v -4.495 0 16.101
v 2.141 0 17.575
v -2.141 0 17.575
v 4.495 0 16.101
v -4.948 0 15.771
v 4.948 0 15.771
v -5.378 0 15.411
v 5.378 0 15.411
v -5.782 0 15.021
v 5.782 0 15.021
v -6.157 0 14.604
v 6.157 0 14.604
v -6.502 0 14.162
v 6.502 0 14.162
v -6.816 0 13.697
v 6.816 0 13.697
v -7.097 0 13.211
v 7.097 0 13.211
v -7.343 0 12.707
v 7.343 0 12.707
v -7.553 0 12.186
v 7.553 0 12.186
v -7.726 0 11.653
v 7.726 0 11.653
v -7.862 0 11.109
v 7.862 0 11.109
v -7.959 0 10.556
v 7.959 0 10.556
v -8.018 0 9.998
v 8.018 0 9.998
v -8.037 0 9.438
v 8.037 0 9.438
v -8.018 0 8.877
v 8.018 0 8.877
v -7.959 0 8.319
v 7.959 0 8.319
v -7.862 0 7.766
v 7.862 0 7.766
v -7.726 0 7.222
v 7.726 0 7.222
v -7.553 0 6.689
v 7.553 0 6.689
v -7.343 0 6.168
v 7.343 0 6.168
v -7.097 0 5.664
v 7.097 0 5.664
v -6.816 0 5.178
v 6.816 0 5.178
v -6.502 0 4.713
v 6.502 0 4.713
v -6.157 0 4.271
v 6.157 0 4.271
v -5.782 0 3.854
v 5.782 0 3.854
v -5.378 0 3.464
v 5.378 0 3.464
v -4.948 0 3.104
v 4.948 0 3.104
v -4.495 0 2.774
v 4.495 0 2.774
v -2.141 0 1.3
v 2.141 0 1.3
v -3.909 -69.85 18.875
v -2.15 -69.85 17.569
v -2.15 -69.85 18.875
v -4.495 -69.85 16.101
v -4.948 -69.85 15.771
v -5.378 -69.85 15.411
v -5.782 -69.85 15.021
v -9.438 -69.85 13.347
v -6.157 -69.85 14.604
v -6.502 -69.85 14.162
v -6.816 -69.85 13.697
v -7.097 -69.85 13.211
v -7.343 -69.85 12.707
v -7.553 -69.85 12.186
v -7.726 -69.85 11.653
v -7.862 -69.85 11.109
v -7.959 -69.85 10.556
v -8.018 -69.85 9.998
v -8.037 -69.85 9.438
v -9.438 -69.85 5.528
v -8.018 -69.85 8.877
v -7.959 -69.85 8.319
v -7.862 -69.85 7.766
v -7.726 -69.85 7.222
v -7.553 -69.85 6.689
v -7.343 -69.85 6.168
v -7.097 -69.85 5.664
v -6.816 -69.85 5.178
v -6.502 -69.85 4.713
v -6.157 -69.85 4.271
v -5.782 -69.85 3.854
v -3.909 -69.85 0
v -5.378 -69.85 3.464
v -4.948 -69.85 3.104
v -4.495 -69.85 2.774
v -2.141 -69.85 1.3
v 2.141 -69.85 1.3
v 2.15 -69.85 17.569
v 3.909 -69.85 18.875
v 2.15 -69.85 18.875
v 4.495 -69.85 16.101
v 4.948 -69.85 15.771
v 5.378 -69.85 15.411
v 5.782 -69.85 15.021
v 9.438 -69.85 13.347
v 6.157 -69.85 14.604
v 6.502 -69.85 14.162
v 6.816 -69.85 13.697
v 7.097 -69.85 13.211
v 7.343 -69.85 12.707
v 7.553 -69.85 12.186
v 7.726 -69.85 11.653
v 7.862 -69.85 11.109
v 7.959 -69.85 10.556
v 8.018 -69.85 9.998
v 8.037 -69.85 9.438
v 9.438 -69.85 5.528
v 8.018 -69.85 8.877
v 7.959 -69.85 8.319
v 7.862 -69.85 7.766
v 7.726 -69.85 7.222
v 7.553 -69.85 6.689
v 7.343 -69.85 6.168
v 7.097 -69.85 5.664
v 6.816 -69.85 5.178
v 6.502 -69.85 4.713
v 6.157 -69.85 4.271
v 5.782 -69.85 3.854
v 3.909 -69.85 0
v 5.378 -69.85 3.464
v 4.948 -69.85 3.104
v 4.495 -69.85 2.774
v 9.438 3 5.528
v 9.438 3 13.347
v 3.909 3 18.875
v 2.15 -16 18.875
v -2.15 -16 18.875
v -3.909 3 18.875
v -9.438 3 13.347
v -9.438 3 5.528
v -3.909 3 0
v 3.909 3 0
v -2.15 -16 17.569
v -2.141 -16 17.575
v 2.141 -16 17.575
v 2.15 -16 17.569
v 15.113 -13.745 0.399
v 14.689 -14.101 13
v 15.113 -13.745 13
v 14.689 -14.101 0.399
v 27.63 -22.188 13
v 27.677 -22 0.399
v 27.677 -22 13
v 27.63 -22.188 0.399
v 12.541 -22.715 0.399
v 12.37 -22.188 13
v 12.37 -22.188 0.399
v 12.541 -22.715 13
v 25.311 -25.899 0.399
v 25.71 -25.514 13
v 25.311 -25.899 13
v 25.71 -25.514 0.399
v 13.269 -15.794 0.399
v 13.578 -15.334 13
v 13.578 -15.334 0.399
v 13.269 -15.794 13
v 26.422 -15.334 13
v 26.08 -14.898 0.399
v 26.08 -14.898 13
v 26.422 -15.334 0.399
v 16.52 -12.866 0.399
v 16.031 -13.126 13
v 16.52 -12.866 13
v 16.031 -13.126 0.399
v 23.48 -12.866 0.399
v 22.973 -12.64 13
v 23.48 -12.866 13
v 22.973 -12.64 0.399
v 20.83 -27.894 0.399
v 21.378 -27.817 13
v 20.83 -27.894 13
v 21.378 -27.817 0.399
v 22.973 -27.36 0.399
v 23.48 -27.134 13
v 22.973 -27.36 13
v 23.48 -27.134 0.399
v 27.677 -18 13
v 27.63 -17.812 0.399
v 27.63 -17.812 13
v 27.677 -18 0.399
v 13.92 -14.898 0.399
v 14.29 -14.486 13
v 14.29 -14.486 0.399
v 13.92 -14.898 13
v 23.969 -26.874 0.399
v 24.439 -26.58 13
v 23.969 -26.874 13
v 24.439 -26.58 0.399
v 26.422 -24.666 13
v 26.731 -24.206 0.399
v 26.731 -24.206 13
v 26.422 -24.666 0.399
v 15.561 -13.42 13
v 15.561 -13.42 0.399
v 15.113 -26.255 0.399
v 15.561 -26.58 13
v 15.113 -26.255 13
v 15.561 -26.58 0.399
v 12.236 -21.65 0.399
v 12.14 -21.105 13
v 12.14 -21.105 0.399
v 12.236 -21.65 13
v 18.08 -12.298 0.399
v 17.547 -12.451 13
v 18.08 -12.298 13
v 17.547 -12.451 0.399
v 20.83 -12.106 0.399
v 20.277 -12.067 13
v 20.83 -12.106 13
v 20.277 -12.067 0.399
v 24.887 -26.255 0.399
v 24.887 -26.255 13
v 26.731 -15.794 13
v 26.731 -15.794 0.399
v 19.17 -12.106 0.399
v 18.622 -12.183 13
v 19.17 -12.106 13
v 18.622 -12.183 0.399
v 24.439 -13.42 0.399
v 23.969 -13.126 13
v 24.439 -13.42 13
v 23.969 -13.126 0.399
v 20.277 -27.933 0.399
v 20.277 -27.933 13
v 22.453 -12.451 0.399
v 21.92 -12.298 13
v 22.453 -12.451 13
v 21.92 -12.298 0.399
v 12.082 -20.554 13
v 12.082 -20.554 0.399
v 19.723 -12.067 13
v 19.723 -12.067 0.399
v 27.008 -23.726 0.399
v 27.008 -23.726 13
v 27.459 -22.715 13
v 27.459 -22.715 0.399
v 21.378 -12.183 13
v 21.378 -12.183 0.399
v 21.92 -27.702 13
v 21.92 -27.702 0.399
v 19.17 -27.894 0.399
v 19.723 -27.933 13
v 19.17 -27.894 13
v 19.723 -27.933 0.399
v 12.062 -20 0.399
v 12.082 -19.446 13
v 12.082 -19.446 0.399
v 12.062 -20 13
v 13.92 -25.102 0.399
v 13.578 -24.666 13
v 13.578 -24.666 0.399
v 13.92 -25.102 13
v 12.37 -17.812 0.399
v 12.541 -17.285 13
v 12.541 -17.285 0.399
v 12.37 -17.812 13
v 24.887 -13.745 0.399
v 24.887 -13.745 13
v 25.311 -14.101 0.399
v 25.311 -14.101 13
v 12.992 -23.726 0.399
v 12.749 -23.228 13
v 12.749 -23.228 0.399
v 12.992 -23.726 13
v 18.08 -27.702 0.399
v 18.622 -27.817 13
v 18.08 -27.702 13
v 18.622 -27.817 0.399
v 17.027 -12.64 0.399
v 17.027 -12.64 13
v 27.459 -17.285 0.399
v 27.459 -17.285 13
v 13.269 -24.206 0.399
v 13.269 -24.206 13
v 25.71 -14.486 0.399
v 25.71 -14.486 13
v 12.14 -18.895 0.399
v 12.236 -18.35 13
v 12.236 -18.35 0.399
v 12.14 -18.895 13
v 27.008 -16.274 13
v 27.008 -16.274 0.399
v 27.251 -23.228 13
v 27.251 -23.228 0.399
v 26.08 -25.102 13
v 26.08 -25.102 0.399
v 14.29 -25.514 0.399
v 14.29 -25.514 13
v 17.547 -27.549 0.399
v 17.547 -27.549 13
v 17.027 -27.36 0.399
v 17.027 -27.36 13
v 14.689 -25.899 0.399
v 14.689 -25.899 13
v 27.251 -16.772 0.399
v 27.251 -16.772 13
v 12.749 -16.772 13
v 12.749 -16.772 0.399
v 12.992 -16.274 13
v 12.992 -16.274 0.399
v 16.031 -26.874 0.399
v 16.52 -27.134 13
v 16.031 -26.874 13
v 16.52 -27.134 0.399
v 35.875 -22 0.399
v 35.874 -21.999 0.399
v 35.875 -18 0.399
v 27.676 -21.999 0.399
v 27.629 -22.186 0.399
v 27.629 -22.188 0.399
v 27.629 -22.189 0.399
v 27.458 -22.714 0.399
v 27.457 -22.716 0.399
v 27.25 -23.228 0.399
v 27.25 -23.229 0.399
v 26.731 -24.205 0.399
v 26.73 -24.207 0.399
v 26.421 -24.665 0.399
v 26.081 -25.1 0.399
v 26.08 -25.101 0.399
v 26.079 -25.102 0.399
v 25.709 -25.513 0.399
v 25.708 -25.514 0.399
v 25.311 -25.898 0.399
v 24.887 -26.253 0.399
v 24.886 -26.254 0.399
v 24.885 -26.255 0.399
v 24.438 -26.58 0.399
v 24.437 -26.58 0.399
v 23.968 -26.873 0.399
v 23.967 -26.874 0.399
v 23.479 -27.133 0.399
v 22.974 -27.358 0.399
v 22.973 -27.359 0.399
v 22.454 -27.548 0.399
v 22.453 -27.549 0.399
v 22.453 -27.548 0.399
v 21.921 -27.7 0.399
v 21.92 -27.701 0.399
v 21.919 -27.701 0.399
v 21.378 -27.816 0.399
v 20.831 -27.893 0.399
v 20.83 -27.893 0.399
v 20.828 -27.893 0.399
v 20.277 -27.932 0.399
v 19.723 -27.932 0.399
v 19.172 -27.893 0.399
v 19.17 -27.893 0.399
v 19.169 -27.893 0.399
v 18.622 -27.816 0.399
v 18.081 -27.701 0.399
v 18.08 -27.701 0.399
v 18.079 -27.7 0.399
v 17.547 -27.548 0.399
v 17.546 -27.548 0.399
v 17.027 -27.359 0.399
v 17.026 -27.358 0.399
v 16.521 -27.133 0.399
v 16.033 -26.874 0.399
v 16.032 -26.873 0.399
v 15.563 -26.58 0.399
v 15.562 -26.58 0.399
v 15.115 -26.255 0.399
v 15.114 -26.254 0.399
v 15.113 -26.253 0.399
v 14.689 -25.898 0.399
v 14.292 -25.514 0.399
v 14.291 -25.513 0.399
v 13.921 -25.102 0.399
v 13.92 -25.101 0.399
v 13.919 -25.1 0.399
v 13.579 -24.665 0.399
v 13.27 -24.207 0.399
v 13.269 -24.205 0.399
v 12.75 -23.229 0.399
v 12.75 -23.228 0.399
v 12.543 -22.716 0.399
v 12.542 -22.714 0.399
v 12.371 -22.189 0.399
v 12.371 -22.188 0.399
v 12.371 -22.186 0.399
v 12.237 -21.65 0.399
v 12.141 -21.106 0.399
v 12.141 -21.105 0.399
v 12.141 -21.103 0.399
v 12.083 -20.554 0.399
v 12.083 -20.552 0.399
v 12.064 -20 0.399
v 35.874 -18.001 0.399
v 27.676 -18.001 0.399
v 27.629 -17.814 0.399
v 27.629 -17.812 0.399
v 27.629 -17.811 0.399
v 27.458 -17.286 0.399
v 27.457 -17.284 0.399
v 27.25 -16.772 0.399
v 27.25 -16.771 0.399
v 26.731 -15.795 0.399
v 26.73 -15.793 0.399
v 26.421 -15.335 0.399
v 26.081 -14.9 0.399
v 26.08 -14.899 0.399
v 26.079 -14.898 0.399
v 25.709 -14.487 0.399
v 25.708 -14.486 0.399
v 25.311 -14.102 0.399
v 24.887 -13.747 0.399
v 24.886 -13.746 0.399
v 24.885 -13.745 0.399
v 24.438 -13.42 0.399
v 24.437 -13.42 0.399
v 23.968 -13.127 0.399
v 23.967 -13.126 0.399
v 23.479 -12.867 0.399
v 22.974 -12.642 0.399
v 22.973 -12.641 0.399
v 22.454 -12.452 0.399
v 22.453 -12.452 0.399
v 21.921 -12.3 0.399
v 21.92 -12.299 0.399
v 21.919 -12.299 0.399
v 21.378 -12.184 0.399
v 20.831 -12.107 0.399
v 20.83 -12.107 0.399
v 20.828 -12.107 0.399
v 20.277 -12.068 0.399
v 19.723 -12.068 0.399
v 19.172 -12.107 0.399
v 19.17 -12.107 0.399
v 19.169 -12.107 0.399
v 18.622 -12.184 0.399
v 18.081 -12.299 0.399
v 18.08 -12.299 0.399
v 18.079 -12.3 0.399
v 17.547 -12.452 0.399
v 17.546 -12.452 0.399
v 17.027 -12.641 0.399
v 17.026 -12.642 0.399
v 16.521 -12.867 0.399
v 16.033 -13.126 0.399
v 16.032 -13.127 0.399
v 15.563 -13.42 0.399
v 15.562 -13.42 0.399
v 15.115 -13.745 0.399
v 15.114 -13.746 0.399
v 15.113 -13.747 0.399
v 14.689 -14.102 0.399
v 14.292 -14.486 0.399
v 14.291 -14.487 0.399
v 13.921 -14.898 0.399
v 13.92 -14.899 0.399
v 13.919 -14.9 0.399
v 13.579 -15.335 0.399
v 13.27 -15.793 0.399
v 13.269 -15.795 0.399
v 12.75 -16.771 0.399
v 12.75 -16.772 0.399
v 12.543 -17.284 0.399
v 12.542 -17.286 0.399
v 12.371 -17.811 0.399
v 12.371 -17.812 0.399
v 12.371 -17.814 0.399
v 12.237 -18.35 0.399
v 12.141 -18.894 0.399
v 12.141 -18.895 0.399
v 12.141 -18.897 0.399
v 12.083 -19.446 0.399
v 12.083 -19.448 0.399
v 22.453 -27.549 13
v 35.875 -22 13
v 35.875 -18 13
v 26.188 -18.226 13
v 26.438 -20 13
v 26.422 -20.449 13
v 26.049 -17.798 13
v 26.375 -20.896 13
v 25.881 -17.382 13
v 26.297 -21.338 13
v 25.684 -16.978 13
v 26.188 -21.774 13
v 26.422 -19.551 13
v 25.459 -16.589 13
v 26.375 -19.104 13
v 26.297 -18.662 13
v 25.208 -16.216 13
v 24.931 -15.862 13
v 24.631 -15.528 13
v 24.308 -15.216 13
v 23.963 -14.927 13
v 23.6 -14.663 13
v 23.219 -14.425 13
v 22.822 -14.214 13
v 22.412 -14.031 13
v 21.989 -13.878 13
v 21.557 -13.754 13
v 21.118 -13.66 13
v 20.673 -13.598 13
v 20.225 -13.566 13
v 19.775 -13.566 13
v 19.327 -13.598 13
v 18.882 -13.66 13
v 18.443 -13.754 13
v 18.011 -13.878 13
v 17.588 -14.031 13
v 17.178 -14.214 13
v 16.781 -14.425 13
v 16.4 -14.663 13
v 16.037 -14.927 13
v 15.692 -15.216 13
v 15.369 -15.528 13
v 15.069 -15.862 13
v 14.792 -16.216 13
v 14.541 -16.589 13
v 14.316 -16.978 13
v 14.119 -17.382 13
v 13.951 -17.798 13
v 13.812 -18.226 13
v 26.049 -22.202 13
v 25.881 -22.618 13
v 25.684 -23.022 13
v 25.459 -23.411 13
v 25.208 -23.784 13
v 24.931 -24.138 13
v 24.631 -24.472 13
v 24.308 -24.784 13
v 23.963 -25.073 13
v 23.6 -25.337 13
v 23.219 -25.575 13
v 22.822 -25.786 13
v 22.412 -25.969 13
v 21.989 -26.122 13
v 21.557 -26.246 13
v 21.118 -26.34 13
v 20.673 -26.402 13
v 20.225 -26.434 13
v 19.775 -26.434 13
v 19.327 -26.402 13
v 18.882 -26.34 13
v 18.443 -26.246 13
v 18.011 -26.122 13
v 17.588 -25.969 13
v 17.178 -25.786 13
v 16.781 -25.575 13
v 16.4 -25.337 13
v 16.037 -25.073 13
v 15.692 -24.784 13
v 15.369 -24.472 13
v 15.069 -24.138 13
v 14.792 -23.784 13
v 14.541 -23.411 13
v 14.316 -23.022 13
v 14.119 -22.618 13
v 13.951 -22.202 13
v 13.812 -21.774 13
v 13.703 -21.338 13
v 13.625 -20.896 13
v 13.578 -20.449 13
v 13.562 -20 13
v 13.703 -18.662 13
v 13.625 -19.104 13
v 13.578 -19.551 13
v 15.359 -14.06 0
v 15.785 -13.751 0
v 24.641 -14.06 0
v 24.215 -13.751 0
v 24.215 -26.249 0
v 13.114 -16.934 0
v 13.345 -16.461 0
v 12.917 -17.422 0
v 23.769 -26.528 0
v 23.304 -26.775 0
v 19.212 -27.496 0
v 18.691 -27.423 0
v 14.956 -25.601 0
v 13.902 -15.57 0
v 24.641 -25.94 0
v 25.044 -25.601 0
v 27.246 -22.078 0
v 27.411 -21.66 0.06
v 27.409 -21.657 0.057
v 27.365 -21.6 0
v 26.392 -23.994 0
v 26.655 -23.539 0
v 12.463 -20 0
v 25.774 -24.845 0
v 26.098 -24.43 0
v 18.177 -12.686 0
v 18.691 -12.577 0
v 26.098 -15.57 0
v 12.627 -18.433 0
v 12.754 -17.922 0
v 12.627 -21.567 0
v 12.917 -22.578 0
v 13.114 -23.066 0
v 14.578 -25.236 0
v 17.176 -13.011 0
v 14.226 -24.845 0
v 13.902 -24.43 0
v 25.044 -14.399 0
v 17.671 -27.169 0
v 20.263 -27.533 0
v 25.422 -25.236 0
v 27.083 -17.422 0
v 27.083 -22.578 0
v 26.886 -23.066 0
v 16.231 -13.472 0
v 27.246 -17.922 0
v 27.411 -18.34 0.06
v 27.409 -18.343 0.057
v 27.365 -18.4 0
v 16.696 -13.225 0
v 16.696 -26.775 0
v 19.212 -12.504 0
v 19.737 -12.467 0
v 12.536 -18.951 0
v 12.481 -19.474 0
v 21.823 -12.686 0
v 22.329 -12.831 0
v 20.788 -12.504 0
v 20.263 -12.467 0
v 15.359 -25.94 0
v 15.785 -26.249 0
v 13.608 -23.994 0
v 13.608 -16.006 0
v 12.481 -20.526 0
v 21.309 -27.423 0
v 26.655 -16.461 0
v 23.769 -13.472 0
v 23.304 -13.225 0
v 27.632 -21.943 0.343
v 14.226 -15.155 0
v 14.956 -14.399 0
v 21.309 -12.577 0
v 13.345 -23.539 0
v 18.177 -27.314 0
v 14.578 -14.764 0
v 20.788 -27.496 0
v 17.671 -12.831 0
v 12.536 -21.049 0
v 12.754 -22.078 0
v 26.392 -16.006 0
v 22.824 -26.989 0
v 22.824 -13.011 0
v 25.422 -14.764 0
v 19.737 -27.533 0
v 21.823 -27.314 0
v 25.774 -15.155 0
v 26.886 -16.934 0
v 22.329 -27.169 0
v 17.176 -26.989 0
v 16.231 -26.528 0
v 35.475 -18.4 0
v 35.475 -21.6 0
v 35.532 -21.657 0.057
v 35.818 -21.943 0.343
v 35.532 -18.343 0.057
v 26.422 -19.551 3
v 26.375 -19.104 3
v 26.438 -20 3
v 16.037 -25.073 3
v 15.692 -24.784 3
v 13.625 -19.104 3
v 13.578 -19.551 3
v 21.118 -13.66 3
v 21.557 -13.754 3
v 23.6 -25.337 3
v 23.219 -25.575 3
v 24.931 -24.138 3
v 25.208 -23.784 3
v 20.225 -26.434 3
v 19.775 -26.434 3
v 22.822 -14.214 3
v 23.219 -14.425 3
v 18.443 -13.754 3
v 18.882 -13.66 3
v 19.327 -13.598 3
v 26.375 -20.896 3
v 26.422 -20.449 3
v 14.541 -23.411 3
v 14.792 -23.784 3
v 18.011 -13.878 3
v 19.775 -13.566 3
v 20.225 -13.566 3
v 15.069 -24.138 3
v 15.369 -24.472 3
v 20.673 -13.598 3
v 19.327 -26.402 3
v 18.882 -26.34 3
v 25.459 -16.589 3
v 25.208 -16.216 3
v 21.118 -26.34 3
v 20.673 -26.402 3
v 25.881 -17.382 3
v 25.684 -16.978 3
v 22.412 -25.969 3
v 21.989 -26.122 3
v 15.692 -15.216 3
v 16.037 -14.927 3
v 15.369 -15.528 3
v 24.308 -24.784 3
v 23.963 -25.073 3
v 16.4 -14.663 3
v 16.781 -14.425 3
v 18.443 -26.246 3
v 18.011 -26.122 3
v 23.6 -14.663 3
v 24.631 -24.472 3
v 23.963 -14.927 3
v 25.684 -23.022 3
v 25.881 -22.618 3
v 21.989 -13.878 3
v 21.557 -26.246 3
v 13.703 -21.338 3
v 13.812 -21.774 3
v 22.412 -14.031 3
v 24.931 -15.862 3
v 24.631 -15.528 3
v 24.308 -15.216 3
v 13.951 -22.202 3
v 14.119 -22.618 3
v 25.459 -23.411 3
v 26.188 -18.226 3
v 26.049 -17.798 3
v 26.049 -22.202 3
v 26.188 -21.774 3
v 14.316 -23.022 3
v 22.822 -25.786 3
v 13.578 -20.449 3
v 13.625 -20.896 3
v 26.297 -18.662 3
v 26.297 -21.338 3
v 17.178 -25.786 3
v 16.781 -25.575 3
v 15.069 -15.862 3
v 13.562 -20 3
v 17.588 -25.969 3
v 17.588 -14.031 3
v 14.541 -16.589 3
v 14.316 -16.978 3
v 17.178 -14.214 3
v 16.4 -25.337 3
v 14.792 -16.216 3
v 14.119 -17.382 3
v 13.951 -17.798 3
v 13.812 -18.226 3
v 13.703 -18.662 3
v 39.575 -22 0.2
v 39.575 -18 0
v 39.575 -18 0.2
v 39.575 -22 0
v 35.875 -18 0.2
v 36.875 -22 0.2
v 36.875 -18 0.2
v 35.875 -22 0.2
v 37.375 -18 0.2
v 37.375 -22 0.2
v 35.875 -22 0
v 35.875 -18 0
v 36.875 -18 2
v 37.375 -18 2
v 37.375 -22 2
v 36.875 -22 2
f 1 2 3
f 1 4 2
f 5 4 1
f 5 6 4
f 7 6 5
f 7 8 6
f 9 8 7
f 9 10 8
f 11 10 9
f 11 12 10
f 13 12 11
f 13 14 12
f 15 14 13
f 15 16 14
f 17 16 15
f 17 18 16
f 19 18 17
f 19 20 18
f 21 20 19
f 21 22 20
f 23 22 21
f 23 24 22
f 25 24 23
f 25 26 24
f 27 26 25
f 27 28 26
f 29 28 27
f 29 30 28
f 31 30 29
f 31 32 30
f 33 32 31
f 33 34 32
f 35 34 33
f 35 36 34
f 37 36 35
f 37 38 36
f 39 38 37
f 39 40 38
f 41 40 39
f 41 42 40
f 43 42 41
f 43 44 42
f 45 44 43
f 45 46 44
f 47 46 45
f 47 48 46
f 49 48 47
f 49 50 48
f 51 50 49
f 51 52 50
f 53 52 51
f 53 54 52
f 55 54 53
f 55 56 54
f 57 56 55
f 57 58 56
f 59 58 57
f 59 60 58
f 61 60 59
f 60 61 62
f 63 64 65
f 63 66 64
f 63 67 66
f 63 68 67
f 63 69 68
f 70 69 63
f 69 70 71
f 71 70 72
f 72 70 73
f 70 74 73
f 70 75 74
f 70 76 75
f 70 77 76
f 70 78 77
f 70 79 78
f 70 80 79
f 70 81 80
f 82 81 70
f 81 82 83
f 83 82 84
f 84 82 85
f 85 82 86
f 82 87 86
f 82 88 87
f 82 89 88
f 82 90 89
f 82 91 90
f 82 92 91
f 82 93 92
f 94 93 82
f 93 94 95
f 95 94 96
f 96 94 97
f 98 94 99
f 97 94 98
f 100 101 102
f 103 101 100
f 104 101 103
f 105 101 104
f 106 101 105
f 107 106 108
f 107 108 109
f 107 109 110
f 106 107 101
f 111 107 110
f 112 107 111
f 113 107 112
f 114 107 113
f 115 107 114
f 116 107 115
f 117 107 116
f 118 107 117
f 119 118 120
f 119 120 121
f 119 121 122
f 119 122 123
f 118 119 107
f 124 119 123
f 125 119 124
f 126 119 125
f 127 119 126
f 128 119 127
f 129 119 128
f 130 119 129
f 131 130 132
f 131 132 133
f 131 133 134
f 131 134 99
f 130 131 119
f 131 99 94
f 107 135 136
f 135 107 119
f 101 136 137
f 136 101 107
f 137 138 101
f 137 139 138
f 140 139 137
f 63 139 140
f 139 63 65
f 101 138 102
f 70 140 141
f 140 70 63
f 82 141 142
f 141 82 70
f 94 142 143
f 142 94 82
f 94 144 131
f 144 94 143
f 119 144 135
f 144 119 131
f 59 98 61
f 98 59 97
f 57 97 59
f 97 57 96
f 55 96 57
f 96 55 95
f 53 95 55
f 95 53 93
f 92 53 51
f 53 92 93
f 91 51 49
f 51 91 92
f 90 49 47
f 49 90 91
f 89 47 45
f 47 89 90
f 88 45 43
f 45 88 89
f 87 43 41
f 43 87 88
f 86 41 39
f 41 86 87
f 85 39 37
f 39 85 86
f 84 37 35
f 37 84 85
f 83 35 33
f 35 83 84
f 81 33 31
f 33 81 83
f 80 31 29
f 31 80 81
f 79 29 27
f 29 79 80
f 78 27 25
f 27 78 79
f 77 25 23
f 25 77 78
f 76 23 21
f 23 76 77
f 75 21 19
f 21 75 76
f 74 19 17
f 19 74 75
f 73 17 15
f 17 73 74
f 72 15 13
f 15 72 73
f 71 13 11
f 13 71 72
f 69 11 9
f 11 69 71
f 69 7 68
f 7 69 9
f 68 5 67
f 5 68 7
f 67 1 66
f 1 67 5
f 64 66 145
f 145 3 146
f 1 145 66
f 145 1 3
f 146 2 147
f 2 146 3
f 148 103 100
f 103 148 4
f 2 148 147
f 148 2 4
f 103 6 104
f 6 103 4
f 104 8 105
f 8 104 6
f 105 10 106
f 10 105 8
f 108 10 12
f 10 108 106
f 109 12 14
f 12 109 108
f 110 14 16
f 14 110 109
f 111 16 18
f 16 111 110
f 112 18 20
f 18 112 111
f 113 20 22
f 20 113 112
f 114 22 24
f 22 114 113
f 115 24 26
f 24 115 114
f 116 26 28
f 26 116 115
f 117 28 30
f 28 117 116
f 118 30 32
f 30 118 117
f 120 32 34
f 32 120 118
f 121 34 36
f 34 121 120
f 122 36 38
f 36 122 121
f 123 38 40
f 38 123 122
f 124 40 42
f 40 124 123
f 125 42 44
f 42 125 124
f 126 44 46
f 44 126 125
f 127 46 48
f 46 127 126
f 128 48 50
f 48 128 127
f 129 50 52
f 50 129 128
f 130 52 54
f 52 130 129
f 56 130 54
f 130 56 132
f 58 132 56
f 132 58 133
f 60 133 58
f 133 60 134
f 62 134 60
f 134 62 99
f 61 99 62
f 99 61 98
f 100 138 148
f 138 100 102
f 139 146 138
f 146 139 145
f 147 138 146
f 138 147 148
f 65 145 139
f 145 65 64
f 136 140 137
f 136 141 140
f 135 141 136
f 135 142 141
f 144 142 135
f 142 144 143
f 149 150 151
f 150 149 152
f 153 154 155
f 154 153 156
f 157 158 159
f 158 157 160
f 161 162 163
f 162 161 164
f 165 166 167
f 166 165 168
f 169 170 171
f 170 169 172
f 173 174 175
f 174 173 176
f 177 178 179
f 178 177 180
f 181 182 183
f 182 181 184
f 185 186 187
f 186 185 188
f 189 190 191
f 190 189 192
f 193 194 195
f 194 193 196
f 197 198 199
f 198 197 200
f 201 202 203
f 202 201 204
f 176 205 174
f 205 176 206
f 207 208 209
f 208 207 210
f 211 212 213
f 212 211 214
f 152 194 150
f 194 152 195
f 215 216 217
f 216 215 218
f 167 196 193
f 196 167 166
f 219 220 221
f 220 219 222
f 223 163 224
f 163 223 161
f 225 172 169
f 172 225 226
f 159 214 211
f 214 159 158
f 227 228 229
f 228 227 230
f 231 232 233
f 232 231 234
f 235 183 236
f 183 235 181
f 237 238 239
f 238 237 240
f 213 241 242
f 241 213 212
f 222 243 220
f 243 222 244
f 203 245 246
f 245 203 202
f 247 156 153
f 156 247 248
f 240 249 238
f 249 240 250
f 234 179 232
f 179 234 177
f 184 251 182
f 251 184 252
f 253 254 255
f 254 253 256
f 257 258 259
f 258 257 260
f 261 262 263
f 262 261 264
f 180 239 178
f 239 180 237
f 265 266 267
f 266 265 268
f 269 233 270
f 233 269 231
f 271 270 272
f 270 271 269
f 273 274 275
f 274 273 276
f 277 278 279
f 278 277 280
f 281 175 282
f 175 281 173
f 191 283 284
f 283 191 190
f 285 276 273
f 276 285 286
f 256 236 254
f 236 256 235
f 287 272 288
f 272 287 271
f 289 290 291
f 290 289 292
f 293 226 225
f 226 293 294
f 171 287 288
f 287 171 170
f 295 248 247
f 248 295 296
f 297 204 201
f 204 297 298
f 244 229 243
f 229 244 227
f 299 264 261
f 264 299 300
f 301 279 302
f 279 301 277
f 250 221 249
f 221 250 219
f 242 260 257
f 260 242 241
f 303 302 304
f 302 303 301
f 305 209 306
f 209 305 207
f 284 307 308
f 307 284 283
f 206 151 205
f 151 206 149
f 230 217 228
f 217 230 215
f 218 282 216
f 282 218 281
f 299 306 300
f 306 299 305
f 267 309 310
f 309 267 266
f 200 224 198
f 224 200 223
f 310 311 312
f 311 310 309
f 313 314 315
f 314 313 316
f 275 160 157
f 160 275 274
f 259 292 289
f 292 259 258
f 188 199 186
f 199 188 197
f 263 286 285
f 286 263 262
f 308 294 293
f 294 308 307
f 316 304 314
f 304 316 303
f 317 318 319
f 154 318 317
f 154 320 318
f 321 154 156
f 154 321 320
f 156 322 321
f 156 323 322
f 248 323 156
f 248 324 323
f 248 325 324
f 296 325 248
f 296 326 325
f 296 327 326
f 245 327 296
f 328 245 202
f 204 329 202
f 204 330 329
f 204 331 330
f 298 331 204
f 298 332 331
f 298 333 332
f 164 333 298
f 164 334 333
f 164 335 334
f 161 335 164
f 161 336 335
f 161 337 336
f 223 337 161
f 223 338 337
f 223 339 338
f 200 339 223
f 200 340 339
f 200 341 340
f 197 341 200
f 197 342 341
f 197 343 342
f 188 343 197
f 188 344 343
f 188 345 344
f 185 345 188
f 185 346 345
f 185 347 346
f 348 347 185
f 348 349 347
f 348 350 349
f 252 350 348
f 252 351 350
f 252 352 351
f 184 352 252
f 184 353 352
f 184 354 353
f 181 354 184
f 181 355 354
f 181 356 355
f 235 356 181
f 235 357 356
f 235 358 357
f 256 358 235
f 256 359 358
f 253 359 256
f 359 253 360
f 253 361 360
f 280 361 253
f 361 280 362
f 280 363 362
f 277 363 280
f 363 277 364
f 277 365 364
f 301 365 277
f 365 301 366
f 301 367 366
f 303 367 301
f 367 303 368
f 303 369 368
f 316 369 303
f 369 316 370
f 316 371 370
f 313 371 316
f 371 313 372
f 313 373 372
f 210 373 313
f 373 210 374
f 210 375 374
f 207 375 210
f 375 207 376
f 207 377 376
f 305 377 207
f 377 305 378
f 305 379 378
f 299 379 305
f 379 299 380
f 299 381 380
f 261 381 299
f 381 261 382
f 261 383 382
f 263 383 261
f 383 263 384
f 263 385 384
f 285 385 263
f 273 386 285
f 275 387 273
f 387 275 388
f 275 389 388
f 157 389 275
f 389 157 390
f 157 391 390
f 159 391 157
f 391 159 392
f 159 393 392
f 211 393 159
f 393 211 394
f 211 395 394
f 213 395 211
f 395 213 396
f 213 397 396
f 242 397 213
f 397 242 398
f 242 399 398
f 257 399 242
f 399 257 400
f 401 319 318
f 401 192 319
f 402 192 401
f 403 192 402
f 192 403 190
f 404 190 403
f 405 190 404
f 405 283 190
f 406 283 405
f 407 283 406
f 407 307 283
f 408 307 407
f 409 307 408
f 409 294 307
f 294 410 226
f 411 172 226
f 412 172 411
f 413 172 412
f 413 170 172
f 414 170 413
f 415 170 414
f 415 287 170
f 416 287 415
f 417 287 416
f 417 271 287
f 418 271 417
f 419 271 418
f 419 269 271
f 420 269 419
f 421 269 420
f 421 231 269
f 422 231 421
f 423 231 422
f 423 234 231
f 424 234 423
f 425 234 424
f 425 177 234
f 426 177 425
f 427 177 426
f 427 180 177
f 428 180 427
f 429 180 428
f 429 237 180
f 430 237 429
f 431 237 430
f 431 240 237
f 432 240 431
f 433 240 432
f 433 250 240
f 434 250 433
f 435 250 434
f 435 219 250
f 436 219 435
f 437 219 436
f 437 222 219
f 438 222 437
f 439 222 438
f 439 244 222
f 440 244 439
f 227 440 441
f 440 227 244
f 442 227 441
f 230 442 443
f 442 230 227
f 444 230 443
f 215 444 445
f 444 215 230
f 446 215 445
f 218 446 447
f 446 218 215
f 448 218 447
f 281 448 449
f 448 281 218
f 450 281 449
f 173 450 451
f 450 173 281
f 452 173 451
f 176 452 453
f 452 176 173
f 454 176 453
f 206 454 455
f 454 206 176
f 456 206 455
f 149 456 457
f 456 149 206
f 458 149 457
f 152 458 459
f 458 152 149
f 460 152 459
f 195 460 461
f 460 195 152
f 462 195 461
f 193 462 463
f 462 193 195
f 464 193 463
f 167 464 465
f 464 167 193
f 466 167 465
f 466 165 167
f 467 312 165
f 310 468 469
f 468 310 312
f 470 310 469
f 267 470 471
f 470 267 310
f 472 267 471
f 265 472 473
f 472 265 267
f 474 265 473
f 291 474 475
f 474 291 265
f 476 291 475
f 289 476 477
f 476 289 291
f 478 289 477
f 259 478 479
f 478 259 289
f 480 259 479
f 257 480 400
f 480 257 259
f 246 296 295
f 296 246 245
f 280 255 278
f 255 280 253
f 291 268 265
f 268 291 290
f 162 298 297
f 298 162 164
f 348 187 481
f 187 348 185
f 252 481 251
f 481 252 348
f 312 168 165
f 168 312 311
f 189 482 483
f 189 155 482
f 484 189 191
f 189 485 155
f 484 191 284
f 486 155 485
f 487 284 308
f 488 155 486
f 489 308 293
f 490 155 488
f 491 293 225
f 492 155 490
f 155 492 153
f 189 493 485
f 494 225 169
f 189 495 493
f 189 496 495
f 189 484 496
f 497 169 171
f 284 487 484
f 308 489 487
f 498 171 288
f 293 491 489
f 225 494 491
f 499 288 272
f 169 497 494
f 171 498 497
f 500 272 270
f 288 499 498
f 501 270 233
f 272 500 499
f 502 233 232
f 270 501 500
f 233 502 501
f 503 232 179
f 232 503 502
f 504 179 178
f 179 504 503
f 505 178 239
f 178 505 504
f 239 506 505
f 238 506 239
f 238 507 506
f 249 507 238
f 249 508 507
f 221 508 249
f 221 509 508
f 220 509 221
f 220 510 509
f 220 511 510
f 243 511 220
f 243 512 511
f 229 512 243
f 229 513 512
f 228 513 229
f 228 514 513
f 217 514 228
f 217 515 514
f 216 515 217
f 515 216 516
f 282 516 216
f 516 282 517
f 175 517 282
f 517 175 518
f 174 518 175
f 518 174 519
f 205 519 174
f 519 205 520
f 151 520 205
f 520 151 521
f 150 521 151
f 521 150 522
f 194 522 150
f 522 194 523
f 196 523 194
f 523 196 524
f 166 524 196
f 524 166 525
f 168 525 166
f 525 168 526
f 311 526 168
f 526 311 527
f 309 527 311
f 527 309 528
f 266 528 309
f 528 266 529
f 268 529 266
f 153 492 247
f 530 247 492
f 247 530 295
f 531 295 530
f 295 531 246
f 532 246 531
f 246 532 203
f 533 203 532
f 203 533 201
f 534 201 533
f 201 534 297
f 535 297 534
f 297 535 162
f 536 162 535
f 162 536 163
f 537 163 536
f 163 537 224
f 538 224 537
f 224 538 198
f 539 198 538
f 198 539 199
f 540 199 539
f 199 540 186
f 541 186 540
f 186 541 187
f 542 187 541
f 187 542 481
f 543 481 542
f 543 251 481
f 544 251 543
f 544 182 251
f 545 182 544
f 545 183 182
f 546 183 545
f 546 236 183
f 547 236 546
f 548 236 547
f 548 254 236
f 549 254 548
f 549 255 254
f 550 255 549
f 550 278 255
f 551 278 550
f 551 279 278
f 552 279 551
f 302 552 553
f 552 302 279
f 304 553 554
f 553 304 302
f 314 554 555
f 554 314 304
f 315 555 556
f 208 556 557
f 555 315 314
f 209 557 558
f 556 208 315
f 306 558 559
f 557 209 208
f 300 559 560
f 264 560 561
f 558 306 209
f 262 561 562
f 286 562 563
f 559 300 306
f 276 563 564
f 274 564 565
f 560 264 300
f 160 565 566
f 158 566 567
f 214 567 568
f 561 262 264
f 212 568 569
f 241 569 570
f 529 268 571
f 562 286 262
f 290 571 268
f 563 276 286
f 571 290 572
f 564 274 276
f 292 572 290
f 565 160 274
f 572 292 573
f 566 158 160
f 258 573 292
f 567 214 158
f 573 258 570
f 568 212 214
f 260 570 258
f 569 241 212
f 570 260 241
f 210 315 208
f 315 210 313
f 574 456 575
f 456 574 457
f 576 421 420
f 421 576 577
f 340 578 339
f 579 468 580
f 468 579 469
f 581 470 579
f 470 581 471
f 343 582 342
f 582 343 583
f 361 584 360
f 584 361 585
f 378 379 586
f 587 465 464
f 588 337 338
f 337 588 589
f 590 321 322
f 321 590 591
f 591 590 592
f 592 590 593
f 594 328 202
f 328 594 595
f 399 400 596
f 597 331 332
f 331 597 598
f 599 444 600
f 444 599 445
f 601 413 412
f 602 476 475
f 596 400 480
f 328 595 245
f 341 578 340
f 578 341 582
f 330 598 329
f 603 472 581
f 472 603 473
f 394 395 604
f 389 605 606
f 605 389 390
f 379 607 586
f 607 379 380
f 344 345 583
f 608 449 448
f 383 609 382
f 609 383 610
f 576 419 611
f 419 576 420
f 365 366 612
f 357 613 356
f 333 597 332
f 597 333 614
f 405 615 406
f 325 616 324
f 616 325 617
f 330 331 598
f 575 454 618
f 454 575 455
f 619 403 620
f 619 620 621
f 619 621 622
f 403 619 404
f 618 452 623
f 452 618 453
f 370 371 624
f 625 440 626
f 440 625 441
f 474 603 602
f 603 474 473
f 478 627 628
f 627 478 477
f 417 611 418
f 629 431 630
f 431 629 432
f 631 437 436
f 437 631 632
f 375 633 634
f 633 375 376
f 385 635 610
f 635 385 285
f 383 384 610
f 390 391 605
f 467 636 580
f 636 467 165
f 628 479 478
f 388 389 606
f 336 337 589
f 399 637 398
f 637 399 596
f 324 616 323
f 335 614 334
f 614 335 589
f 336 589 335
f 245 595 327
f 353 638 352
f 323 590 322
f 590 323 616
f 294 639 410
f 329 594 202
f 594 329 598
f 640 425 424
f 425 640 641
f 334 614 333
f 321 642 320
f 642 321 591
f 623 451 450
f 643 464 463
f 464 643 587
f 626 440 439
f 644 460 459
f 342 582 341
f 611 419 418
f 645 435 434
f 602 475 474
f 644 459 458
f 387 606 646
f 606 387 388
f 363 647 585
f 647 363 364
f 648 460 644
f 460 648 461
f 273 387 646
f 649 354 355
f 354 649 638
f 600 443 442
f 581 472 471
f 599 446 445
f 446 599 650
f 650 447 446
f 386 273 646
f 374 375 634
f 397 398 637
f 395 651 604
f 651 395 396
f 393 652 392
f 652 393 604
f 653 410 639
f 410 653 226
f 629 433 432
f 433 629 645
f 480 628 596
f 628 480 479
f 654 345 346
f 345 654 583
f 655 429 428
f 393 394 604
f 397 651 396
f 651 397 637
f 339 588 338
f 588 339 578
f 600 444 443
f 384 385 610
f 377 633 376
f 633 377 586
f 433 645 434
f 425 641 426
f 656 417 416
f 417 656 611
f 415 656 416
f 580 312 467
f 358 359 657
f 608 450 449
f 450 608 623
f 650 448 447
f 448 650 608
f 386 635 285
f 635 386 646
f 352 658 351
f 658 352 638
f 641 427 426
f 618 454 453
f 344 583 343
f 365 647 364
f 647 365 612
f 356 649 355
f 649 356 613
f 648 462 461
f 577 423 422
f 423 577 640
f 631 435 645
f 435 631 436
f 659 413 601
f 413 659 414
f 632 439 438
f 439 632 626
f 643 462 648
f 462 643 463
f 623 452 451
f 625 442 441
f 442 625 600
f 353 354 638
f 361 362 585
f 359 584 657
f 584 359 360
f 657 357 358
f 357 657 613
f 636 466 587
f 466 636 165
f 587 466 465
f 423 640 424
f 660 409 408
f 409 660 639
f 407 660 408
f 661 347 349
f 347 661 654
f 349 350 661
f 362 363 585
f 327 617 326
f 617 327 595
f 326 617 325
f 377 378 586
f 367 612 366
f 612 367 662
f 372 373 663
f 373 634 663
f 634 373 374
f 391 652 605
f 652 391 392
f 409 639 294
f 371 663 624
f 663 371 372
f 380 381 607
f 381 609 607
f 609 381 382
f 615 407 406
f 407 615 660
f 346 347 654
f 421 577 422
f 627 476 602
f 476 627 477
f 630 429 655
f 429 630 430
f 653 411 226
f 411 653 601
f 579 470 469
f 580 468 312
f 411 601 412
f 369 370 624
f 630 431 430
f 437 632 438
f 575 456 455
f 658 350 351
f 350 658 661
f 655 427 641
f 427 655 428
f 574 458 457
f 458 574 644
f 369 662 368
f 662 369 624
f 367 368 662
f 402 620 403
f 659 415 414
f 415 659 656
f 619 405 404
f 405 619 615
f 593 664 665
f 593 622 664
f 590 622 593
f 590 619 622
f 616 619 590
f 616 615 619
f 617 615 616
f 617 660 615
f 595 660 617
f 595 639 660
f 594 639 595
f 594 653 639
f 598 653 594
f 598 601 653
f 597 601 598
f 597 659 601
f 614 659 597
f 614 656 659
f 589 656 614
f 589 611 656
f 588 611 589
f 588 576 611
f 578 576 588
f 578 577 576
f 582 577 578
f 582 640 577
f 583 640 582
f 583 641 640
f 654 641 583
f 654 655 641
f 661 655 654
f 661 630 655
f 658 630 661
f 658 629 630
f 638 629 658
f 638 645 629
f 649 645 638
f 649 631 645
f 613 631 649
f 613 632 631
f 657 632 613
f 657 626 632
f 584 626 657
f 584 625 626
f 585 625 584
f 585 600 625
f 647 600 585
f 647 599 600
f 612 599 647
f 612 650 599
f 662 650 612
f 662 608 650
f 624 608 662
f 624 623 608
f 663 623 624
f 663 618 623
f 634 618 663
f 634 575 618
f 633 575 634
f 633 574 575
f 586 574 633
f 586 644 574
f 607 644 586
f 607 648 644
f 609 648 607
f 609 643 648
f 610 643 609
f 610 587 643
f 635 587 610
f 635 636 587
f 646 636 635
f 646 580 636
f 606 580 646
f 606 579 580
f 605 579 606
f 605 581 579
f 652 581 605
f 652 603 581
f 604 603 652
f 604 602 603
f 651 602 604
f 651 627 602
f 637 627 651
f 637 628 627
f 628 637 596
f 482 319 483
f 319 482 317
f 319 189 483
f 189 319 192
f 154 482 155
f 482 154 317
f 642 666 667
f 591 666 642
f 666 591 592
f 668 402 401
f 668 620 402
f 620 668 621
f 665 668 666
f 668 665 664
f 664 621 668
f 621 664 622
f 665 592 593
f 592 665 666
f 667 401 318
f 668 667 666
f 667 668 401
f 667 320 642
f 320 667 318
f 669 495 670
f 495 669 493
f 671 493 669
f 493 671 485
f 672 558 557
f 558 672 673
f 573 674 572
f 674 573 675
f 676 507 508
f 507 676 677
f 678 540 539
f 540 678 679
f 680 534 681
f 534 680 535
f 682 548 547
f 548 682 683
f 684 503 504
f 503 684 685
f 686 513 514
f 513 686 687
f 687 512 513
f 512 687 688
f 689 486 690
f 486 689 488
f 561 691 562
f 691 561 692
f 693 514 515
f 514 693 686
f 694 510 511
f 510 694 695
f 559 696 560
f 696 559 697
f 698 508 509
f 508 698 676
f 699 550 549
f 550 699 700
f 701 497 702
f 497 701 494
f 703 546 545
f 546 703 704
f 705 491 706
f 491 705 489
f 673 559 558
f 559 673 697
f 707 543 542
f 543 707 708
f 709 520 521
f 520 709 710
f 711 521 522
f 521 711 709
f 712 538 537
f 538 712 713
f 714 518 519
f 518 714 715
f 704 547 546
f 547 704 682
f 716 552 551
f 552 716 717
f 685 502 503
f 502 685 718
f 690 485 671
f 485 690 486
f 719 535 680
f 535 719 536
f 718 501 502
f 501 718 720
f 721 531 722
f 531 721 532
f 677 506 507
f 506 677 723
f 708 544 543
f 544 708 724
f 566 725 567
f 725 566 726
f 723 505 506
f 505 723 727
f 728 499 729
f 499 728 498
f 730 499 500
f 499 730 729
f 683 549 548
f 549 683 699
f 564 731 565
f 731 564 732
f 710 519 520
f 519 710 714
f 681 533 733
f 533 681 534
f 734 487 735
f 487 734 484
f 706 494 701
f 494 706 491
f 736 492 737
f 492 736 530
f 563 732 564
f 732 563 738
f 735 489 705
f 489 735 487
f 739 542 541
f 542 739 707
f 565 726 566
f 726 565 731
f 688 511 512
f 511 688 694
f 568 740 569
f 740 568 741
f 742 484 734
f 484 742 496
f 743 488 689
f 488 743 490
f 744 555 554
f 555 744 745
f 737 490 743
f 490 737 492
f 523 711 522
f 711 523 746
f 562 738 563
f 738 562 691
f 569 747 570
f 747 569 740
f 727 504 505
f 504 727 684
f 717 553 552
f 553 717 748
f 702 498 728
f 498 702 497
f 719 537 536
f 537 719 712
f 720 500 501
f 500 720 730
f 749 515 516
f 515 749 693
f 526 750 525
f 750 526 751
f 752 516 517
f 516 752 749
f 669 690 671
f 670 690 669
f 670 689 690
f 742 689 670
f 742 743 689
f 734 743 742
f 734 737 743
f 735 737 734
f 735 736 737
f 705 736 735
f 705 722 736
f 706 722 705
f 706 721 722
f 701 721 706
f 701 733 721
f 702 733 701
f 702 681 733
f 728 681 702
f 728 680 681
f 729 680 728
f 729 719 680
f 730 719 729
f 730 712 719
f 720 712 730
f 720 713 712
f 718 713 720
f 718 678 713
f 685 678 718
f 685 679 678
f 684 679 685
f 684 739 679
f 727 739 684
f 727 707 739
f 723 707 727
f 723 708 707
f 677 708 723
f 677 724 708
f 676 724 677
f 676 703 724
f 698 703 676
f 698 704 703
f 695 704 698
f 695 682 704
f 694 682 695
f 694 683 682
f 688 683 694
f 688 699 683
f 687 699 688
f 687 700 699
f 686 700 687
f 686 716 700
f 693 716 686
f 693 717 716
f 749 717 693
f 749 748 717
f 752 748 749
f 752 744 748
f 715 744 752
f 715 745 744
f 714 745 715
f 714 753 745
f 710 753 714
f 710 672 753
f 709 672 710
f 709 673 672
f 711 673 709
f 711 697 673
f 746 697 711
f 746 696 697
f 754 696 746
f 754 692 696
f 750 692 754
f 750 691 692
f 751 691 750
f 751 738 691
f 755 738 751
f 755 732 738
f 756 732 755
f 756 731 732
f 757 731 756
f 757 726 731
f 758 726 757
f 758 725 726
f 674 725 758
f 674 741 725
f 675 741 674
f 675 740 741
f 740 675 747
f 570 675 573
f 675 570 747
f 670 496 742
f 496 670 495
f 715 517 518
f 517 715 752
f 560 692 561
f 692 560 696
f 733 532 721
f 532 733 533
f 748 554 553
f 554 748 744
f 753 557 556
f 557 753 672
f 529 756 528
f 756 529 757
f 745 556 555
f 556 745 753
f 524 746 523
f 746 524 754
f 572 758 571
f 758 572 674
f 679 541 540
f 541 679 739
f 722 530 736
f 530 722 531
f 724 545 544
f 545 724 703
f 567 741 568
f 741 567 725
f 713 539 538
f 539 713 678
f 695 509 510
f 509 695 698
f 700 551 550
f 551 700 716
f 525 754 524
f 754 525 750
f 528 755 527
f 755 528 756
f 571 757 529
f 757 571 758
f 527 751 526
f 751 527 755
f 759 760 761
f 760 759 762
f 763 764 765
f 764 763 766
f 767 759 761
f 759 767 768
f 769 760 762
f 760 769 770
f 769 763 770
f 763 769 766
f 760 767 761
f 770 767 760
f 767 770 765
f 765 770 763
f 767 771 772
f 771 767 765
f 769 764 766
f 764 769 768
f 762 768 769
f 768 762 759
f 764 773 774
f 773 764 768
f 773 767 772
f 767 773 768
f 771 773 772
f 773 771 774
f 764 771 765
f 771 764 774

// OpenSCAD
// file: common.scad
$fa = 4;
$fs = 0.1;
eps = 0.001;

// An inward chamfer sufficient to prevent elephant's foot.
foot = 0.4;

// FINDINGS FROM CLEARANCE TEST
//
// Consider a vertical hole of width X, a layer height of 0.2, and a vertical
// post.
//   * A post of diameter X will not fit in.
//   * A post of diameter X-0.1 will fit in, but is very hard to slide in or out.
//     This is probably due mostly to the transverse grain of the print.
//     It will rotate, but with some resistance.
//   * A post of diameter X-0.2 slides in and out easily. It rotates easily, but
//     still has noticeable resistance at some points.
//   * A post of diameter X-0.3 rotates freely. It also has noticeable play
//     from side to side.
//
// Clearances are expressed as the total across both sides of a joint.
tight = 0.1;  // Intended for stationary joints.
snug = 0.2;   // Moves, but with some resistance.
loose = 0.3;  // Moves easily, with some jiggle.

// A brim is a 0.2mm layer printed near an edge which is likely to warp.
// The edge should be chamfered outwards at 45 degrees. The brim should
// be placed this far from the bottom of the edge, so it barely touches
// the chamfer.
brim_offset = 0.3;

// Menards 5/8 x 2-3/4 x 0.04 WG compression spring.
spring_od = 5/8 * 25.4;
// Subtract 10 from the relaxed length so everything is slightly tensioned
// all the time.
spring_max_length = 2.75 * 25.4 - 10;
spring_min_length = 16;  // Approximate.

module octagon(diameter) {
  intersection_for(a = [0, 45])
    rotate([0, 0, a])
      square(diameter, center=true);
}

// A cylinder with a chamfered or flared bottom end, useful for dealing
// with elephant's foot on pins or holes.
module flare_cylinder(height, radius, flare) {
  translate([0, 0, abs(flare)-eps])
    cylinder(height-abs(flare)+eps, radius, radius);

  linear_extrude(abs(flare), scale=radius/(radius-flare))
    circle(radius-flare);
}

// A cube with a chamfered or flared bottom end, useful for dealing
// with elephant's foot on pins or holes.
module flare_cube(dims, flare) {
  translate([0, 0, abs(flare)-eps])
    cube([dims.x, dims.y, dims.z - abs(flare) + eps]);

  translate([dims.x/2, dims.y/2, 0])
    linear_extrude(abs(flare), scale=[dims.x/(dims.x-2*flare), dims.y/(dims.y-2*flare)])
      translate([-(dims.x-2*flare)/2, -(dims.y-2*flare)/2, abs(flare)-eps])
        square([dims.x-2*flare, dims.y-2*flare]);
}

// An approximate circle which can be printed on its side.
module circle_ish(r) {
  // Safe overhang angle.
  q = 32;
  
  intersection() {
    // Add 0.2 (one print layer) in case the bridge is messy and hangs
    // down.
    square(2*r+0.2, center=true);
    hull() {
      circle(r);
      for (a = [-1, 1])
        translate([0, a*r/cos(q), 0])
          square(eps, center=true);
    }
  }
}
// main file
include <common.scad>

wall = 1.5;
base = 3;
exterior_diameter = spring_od+wall*2;
extra_tube_length = 10;
follower_length = 13;
finger_width = 4;

module tube() {
  translate([0, 0, spring_od/2+wall]) {
    rotate([90, 0, 0]) {
      difference() {
        // Tube.
        linear_extrude(spring_max_length + extra_tube_length) {
          difference() {
            octagon(exterior_diameter);
            circle_ish((spring_od + snug)/2);
          }
        }
        
        // Finger slot.
        translate([-(finger_width+loose)/2, 0, spring_min_length])
          cube([
            finger_width+loose,
            spring_od,
            spring_max_length + extra_tube_length
          ]);
      }
      
      // End cap.
      translate([0, 0, -base])
        linear_extrude(base)
          octagon(exterior_diameter);
    }
  }
}

module follower() {
  difference() {
    // Exterior.
    union() {
      flare_cylinder(follower_length, spring_od/2, foot);
      translate([0, -finger_width/2, 0])
        flare_cube([spring_od, finger_width, follower_length], foot);
    }
    
    // Cutout to save volume.
    translate([0, 0, base])
      cylinder(follower_length, d=spring_od-wall*2);
  }
  
  // Adhesion aid.
  translate([spring_od, -(finger_width)/2, 0])
    cube([4-brim_offset, finger_width, 0.2]);
  translate([spring_od+1, -(finger_width)/2, 0])
    cube([0.5, finger_width, 2]);
}

tube();
translate([20, -20, 0]) follower();
